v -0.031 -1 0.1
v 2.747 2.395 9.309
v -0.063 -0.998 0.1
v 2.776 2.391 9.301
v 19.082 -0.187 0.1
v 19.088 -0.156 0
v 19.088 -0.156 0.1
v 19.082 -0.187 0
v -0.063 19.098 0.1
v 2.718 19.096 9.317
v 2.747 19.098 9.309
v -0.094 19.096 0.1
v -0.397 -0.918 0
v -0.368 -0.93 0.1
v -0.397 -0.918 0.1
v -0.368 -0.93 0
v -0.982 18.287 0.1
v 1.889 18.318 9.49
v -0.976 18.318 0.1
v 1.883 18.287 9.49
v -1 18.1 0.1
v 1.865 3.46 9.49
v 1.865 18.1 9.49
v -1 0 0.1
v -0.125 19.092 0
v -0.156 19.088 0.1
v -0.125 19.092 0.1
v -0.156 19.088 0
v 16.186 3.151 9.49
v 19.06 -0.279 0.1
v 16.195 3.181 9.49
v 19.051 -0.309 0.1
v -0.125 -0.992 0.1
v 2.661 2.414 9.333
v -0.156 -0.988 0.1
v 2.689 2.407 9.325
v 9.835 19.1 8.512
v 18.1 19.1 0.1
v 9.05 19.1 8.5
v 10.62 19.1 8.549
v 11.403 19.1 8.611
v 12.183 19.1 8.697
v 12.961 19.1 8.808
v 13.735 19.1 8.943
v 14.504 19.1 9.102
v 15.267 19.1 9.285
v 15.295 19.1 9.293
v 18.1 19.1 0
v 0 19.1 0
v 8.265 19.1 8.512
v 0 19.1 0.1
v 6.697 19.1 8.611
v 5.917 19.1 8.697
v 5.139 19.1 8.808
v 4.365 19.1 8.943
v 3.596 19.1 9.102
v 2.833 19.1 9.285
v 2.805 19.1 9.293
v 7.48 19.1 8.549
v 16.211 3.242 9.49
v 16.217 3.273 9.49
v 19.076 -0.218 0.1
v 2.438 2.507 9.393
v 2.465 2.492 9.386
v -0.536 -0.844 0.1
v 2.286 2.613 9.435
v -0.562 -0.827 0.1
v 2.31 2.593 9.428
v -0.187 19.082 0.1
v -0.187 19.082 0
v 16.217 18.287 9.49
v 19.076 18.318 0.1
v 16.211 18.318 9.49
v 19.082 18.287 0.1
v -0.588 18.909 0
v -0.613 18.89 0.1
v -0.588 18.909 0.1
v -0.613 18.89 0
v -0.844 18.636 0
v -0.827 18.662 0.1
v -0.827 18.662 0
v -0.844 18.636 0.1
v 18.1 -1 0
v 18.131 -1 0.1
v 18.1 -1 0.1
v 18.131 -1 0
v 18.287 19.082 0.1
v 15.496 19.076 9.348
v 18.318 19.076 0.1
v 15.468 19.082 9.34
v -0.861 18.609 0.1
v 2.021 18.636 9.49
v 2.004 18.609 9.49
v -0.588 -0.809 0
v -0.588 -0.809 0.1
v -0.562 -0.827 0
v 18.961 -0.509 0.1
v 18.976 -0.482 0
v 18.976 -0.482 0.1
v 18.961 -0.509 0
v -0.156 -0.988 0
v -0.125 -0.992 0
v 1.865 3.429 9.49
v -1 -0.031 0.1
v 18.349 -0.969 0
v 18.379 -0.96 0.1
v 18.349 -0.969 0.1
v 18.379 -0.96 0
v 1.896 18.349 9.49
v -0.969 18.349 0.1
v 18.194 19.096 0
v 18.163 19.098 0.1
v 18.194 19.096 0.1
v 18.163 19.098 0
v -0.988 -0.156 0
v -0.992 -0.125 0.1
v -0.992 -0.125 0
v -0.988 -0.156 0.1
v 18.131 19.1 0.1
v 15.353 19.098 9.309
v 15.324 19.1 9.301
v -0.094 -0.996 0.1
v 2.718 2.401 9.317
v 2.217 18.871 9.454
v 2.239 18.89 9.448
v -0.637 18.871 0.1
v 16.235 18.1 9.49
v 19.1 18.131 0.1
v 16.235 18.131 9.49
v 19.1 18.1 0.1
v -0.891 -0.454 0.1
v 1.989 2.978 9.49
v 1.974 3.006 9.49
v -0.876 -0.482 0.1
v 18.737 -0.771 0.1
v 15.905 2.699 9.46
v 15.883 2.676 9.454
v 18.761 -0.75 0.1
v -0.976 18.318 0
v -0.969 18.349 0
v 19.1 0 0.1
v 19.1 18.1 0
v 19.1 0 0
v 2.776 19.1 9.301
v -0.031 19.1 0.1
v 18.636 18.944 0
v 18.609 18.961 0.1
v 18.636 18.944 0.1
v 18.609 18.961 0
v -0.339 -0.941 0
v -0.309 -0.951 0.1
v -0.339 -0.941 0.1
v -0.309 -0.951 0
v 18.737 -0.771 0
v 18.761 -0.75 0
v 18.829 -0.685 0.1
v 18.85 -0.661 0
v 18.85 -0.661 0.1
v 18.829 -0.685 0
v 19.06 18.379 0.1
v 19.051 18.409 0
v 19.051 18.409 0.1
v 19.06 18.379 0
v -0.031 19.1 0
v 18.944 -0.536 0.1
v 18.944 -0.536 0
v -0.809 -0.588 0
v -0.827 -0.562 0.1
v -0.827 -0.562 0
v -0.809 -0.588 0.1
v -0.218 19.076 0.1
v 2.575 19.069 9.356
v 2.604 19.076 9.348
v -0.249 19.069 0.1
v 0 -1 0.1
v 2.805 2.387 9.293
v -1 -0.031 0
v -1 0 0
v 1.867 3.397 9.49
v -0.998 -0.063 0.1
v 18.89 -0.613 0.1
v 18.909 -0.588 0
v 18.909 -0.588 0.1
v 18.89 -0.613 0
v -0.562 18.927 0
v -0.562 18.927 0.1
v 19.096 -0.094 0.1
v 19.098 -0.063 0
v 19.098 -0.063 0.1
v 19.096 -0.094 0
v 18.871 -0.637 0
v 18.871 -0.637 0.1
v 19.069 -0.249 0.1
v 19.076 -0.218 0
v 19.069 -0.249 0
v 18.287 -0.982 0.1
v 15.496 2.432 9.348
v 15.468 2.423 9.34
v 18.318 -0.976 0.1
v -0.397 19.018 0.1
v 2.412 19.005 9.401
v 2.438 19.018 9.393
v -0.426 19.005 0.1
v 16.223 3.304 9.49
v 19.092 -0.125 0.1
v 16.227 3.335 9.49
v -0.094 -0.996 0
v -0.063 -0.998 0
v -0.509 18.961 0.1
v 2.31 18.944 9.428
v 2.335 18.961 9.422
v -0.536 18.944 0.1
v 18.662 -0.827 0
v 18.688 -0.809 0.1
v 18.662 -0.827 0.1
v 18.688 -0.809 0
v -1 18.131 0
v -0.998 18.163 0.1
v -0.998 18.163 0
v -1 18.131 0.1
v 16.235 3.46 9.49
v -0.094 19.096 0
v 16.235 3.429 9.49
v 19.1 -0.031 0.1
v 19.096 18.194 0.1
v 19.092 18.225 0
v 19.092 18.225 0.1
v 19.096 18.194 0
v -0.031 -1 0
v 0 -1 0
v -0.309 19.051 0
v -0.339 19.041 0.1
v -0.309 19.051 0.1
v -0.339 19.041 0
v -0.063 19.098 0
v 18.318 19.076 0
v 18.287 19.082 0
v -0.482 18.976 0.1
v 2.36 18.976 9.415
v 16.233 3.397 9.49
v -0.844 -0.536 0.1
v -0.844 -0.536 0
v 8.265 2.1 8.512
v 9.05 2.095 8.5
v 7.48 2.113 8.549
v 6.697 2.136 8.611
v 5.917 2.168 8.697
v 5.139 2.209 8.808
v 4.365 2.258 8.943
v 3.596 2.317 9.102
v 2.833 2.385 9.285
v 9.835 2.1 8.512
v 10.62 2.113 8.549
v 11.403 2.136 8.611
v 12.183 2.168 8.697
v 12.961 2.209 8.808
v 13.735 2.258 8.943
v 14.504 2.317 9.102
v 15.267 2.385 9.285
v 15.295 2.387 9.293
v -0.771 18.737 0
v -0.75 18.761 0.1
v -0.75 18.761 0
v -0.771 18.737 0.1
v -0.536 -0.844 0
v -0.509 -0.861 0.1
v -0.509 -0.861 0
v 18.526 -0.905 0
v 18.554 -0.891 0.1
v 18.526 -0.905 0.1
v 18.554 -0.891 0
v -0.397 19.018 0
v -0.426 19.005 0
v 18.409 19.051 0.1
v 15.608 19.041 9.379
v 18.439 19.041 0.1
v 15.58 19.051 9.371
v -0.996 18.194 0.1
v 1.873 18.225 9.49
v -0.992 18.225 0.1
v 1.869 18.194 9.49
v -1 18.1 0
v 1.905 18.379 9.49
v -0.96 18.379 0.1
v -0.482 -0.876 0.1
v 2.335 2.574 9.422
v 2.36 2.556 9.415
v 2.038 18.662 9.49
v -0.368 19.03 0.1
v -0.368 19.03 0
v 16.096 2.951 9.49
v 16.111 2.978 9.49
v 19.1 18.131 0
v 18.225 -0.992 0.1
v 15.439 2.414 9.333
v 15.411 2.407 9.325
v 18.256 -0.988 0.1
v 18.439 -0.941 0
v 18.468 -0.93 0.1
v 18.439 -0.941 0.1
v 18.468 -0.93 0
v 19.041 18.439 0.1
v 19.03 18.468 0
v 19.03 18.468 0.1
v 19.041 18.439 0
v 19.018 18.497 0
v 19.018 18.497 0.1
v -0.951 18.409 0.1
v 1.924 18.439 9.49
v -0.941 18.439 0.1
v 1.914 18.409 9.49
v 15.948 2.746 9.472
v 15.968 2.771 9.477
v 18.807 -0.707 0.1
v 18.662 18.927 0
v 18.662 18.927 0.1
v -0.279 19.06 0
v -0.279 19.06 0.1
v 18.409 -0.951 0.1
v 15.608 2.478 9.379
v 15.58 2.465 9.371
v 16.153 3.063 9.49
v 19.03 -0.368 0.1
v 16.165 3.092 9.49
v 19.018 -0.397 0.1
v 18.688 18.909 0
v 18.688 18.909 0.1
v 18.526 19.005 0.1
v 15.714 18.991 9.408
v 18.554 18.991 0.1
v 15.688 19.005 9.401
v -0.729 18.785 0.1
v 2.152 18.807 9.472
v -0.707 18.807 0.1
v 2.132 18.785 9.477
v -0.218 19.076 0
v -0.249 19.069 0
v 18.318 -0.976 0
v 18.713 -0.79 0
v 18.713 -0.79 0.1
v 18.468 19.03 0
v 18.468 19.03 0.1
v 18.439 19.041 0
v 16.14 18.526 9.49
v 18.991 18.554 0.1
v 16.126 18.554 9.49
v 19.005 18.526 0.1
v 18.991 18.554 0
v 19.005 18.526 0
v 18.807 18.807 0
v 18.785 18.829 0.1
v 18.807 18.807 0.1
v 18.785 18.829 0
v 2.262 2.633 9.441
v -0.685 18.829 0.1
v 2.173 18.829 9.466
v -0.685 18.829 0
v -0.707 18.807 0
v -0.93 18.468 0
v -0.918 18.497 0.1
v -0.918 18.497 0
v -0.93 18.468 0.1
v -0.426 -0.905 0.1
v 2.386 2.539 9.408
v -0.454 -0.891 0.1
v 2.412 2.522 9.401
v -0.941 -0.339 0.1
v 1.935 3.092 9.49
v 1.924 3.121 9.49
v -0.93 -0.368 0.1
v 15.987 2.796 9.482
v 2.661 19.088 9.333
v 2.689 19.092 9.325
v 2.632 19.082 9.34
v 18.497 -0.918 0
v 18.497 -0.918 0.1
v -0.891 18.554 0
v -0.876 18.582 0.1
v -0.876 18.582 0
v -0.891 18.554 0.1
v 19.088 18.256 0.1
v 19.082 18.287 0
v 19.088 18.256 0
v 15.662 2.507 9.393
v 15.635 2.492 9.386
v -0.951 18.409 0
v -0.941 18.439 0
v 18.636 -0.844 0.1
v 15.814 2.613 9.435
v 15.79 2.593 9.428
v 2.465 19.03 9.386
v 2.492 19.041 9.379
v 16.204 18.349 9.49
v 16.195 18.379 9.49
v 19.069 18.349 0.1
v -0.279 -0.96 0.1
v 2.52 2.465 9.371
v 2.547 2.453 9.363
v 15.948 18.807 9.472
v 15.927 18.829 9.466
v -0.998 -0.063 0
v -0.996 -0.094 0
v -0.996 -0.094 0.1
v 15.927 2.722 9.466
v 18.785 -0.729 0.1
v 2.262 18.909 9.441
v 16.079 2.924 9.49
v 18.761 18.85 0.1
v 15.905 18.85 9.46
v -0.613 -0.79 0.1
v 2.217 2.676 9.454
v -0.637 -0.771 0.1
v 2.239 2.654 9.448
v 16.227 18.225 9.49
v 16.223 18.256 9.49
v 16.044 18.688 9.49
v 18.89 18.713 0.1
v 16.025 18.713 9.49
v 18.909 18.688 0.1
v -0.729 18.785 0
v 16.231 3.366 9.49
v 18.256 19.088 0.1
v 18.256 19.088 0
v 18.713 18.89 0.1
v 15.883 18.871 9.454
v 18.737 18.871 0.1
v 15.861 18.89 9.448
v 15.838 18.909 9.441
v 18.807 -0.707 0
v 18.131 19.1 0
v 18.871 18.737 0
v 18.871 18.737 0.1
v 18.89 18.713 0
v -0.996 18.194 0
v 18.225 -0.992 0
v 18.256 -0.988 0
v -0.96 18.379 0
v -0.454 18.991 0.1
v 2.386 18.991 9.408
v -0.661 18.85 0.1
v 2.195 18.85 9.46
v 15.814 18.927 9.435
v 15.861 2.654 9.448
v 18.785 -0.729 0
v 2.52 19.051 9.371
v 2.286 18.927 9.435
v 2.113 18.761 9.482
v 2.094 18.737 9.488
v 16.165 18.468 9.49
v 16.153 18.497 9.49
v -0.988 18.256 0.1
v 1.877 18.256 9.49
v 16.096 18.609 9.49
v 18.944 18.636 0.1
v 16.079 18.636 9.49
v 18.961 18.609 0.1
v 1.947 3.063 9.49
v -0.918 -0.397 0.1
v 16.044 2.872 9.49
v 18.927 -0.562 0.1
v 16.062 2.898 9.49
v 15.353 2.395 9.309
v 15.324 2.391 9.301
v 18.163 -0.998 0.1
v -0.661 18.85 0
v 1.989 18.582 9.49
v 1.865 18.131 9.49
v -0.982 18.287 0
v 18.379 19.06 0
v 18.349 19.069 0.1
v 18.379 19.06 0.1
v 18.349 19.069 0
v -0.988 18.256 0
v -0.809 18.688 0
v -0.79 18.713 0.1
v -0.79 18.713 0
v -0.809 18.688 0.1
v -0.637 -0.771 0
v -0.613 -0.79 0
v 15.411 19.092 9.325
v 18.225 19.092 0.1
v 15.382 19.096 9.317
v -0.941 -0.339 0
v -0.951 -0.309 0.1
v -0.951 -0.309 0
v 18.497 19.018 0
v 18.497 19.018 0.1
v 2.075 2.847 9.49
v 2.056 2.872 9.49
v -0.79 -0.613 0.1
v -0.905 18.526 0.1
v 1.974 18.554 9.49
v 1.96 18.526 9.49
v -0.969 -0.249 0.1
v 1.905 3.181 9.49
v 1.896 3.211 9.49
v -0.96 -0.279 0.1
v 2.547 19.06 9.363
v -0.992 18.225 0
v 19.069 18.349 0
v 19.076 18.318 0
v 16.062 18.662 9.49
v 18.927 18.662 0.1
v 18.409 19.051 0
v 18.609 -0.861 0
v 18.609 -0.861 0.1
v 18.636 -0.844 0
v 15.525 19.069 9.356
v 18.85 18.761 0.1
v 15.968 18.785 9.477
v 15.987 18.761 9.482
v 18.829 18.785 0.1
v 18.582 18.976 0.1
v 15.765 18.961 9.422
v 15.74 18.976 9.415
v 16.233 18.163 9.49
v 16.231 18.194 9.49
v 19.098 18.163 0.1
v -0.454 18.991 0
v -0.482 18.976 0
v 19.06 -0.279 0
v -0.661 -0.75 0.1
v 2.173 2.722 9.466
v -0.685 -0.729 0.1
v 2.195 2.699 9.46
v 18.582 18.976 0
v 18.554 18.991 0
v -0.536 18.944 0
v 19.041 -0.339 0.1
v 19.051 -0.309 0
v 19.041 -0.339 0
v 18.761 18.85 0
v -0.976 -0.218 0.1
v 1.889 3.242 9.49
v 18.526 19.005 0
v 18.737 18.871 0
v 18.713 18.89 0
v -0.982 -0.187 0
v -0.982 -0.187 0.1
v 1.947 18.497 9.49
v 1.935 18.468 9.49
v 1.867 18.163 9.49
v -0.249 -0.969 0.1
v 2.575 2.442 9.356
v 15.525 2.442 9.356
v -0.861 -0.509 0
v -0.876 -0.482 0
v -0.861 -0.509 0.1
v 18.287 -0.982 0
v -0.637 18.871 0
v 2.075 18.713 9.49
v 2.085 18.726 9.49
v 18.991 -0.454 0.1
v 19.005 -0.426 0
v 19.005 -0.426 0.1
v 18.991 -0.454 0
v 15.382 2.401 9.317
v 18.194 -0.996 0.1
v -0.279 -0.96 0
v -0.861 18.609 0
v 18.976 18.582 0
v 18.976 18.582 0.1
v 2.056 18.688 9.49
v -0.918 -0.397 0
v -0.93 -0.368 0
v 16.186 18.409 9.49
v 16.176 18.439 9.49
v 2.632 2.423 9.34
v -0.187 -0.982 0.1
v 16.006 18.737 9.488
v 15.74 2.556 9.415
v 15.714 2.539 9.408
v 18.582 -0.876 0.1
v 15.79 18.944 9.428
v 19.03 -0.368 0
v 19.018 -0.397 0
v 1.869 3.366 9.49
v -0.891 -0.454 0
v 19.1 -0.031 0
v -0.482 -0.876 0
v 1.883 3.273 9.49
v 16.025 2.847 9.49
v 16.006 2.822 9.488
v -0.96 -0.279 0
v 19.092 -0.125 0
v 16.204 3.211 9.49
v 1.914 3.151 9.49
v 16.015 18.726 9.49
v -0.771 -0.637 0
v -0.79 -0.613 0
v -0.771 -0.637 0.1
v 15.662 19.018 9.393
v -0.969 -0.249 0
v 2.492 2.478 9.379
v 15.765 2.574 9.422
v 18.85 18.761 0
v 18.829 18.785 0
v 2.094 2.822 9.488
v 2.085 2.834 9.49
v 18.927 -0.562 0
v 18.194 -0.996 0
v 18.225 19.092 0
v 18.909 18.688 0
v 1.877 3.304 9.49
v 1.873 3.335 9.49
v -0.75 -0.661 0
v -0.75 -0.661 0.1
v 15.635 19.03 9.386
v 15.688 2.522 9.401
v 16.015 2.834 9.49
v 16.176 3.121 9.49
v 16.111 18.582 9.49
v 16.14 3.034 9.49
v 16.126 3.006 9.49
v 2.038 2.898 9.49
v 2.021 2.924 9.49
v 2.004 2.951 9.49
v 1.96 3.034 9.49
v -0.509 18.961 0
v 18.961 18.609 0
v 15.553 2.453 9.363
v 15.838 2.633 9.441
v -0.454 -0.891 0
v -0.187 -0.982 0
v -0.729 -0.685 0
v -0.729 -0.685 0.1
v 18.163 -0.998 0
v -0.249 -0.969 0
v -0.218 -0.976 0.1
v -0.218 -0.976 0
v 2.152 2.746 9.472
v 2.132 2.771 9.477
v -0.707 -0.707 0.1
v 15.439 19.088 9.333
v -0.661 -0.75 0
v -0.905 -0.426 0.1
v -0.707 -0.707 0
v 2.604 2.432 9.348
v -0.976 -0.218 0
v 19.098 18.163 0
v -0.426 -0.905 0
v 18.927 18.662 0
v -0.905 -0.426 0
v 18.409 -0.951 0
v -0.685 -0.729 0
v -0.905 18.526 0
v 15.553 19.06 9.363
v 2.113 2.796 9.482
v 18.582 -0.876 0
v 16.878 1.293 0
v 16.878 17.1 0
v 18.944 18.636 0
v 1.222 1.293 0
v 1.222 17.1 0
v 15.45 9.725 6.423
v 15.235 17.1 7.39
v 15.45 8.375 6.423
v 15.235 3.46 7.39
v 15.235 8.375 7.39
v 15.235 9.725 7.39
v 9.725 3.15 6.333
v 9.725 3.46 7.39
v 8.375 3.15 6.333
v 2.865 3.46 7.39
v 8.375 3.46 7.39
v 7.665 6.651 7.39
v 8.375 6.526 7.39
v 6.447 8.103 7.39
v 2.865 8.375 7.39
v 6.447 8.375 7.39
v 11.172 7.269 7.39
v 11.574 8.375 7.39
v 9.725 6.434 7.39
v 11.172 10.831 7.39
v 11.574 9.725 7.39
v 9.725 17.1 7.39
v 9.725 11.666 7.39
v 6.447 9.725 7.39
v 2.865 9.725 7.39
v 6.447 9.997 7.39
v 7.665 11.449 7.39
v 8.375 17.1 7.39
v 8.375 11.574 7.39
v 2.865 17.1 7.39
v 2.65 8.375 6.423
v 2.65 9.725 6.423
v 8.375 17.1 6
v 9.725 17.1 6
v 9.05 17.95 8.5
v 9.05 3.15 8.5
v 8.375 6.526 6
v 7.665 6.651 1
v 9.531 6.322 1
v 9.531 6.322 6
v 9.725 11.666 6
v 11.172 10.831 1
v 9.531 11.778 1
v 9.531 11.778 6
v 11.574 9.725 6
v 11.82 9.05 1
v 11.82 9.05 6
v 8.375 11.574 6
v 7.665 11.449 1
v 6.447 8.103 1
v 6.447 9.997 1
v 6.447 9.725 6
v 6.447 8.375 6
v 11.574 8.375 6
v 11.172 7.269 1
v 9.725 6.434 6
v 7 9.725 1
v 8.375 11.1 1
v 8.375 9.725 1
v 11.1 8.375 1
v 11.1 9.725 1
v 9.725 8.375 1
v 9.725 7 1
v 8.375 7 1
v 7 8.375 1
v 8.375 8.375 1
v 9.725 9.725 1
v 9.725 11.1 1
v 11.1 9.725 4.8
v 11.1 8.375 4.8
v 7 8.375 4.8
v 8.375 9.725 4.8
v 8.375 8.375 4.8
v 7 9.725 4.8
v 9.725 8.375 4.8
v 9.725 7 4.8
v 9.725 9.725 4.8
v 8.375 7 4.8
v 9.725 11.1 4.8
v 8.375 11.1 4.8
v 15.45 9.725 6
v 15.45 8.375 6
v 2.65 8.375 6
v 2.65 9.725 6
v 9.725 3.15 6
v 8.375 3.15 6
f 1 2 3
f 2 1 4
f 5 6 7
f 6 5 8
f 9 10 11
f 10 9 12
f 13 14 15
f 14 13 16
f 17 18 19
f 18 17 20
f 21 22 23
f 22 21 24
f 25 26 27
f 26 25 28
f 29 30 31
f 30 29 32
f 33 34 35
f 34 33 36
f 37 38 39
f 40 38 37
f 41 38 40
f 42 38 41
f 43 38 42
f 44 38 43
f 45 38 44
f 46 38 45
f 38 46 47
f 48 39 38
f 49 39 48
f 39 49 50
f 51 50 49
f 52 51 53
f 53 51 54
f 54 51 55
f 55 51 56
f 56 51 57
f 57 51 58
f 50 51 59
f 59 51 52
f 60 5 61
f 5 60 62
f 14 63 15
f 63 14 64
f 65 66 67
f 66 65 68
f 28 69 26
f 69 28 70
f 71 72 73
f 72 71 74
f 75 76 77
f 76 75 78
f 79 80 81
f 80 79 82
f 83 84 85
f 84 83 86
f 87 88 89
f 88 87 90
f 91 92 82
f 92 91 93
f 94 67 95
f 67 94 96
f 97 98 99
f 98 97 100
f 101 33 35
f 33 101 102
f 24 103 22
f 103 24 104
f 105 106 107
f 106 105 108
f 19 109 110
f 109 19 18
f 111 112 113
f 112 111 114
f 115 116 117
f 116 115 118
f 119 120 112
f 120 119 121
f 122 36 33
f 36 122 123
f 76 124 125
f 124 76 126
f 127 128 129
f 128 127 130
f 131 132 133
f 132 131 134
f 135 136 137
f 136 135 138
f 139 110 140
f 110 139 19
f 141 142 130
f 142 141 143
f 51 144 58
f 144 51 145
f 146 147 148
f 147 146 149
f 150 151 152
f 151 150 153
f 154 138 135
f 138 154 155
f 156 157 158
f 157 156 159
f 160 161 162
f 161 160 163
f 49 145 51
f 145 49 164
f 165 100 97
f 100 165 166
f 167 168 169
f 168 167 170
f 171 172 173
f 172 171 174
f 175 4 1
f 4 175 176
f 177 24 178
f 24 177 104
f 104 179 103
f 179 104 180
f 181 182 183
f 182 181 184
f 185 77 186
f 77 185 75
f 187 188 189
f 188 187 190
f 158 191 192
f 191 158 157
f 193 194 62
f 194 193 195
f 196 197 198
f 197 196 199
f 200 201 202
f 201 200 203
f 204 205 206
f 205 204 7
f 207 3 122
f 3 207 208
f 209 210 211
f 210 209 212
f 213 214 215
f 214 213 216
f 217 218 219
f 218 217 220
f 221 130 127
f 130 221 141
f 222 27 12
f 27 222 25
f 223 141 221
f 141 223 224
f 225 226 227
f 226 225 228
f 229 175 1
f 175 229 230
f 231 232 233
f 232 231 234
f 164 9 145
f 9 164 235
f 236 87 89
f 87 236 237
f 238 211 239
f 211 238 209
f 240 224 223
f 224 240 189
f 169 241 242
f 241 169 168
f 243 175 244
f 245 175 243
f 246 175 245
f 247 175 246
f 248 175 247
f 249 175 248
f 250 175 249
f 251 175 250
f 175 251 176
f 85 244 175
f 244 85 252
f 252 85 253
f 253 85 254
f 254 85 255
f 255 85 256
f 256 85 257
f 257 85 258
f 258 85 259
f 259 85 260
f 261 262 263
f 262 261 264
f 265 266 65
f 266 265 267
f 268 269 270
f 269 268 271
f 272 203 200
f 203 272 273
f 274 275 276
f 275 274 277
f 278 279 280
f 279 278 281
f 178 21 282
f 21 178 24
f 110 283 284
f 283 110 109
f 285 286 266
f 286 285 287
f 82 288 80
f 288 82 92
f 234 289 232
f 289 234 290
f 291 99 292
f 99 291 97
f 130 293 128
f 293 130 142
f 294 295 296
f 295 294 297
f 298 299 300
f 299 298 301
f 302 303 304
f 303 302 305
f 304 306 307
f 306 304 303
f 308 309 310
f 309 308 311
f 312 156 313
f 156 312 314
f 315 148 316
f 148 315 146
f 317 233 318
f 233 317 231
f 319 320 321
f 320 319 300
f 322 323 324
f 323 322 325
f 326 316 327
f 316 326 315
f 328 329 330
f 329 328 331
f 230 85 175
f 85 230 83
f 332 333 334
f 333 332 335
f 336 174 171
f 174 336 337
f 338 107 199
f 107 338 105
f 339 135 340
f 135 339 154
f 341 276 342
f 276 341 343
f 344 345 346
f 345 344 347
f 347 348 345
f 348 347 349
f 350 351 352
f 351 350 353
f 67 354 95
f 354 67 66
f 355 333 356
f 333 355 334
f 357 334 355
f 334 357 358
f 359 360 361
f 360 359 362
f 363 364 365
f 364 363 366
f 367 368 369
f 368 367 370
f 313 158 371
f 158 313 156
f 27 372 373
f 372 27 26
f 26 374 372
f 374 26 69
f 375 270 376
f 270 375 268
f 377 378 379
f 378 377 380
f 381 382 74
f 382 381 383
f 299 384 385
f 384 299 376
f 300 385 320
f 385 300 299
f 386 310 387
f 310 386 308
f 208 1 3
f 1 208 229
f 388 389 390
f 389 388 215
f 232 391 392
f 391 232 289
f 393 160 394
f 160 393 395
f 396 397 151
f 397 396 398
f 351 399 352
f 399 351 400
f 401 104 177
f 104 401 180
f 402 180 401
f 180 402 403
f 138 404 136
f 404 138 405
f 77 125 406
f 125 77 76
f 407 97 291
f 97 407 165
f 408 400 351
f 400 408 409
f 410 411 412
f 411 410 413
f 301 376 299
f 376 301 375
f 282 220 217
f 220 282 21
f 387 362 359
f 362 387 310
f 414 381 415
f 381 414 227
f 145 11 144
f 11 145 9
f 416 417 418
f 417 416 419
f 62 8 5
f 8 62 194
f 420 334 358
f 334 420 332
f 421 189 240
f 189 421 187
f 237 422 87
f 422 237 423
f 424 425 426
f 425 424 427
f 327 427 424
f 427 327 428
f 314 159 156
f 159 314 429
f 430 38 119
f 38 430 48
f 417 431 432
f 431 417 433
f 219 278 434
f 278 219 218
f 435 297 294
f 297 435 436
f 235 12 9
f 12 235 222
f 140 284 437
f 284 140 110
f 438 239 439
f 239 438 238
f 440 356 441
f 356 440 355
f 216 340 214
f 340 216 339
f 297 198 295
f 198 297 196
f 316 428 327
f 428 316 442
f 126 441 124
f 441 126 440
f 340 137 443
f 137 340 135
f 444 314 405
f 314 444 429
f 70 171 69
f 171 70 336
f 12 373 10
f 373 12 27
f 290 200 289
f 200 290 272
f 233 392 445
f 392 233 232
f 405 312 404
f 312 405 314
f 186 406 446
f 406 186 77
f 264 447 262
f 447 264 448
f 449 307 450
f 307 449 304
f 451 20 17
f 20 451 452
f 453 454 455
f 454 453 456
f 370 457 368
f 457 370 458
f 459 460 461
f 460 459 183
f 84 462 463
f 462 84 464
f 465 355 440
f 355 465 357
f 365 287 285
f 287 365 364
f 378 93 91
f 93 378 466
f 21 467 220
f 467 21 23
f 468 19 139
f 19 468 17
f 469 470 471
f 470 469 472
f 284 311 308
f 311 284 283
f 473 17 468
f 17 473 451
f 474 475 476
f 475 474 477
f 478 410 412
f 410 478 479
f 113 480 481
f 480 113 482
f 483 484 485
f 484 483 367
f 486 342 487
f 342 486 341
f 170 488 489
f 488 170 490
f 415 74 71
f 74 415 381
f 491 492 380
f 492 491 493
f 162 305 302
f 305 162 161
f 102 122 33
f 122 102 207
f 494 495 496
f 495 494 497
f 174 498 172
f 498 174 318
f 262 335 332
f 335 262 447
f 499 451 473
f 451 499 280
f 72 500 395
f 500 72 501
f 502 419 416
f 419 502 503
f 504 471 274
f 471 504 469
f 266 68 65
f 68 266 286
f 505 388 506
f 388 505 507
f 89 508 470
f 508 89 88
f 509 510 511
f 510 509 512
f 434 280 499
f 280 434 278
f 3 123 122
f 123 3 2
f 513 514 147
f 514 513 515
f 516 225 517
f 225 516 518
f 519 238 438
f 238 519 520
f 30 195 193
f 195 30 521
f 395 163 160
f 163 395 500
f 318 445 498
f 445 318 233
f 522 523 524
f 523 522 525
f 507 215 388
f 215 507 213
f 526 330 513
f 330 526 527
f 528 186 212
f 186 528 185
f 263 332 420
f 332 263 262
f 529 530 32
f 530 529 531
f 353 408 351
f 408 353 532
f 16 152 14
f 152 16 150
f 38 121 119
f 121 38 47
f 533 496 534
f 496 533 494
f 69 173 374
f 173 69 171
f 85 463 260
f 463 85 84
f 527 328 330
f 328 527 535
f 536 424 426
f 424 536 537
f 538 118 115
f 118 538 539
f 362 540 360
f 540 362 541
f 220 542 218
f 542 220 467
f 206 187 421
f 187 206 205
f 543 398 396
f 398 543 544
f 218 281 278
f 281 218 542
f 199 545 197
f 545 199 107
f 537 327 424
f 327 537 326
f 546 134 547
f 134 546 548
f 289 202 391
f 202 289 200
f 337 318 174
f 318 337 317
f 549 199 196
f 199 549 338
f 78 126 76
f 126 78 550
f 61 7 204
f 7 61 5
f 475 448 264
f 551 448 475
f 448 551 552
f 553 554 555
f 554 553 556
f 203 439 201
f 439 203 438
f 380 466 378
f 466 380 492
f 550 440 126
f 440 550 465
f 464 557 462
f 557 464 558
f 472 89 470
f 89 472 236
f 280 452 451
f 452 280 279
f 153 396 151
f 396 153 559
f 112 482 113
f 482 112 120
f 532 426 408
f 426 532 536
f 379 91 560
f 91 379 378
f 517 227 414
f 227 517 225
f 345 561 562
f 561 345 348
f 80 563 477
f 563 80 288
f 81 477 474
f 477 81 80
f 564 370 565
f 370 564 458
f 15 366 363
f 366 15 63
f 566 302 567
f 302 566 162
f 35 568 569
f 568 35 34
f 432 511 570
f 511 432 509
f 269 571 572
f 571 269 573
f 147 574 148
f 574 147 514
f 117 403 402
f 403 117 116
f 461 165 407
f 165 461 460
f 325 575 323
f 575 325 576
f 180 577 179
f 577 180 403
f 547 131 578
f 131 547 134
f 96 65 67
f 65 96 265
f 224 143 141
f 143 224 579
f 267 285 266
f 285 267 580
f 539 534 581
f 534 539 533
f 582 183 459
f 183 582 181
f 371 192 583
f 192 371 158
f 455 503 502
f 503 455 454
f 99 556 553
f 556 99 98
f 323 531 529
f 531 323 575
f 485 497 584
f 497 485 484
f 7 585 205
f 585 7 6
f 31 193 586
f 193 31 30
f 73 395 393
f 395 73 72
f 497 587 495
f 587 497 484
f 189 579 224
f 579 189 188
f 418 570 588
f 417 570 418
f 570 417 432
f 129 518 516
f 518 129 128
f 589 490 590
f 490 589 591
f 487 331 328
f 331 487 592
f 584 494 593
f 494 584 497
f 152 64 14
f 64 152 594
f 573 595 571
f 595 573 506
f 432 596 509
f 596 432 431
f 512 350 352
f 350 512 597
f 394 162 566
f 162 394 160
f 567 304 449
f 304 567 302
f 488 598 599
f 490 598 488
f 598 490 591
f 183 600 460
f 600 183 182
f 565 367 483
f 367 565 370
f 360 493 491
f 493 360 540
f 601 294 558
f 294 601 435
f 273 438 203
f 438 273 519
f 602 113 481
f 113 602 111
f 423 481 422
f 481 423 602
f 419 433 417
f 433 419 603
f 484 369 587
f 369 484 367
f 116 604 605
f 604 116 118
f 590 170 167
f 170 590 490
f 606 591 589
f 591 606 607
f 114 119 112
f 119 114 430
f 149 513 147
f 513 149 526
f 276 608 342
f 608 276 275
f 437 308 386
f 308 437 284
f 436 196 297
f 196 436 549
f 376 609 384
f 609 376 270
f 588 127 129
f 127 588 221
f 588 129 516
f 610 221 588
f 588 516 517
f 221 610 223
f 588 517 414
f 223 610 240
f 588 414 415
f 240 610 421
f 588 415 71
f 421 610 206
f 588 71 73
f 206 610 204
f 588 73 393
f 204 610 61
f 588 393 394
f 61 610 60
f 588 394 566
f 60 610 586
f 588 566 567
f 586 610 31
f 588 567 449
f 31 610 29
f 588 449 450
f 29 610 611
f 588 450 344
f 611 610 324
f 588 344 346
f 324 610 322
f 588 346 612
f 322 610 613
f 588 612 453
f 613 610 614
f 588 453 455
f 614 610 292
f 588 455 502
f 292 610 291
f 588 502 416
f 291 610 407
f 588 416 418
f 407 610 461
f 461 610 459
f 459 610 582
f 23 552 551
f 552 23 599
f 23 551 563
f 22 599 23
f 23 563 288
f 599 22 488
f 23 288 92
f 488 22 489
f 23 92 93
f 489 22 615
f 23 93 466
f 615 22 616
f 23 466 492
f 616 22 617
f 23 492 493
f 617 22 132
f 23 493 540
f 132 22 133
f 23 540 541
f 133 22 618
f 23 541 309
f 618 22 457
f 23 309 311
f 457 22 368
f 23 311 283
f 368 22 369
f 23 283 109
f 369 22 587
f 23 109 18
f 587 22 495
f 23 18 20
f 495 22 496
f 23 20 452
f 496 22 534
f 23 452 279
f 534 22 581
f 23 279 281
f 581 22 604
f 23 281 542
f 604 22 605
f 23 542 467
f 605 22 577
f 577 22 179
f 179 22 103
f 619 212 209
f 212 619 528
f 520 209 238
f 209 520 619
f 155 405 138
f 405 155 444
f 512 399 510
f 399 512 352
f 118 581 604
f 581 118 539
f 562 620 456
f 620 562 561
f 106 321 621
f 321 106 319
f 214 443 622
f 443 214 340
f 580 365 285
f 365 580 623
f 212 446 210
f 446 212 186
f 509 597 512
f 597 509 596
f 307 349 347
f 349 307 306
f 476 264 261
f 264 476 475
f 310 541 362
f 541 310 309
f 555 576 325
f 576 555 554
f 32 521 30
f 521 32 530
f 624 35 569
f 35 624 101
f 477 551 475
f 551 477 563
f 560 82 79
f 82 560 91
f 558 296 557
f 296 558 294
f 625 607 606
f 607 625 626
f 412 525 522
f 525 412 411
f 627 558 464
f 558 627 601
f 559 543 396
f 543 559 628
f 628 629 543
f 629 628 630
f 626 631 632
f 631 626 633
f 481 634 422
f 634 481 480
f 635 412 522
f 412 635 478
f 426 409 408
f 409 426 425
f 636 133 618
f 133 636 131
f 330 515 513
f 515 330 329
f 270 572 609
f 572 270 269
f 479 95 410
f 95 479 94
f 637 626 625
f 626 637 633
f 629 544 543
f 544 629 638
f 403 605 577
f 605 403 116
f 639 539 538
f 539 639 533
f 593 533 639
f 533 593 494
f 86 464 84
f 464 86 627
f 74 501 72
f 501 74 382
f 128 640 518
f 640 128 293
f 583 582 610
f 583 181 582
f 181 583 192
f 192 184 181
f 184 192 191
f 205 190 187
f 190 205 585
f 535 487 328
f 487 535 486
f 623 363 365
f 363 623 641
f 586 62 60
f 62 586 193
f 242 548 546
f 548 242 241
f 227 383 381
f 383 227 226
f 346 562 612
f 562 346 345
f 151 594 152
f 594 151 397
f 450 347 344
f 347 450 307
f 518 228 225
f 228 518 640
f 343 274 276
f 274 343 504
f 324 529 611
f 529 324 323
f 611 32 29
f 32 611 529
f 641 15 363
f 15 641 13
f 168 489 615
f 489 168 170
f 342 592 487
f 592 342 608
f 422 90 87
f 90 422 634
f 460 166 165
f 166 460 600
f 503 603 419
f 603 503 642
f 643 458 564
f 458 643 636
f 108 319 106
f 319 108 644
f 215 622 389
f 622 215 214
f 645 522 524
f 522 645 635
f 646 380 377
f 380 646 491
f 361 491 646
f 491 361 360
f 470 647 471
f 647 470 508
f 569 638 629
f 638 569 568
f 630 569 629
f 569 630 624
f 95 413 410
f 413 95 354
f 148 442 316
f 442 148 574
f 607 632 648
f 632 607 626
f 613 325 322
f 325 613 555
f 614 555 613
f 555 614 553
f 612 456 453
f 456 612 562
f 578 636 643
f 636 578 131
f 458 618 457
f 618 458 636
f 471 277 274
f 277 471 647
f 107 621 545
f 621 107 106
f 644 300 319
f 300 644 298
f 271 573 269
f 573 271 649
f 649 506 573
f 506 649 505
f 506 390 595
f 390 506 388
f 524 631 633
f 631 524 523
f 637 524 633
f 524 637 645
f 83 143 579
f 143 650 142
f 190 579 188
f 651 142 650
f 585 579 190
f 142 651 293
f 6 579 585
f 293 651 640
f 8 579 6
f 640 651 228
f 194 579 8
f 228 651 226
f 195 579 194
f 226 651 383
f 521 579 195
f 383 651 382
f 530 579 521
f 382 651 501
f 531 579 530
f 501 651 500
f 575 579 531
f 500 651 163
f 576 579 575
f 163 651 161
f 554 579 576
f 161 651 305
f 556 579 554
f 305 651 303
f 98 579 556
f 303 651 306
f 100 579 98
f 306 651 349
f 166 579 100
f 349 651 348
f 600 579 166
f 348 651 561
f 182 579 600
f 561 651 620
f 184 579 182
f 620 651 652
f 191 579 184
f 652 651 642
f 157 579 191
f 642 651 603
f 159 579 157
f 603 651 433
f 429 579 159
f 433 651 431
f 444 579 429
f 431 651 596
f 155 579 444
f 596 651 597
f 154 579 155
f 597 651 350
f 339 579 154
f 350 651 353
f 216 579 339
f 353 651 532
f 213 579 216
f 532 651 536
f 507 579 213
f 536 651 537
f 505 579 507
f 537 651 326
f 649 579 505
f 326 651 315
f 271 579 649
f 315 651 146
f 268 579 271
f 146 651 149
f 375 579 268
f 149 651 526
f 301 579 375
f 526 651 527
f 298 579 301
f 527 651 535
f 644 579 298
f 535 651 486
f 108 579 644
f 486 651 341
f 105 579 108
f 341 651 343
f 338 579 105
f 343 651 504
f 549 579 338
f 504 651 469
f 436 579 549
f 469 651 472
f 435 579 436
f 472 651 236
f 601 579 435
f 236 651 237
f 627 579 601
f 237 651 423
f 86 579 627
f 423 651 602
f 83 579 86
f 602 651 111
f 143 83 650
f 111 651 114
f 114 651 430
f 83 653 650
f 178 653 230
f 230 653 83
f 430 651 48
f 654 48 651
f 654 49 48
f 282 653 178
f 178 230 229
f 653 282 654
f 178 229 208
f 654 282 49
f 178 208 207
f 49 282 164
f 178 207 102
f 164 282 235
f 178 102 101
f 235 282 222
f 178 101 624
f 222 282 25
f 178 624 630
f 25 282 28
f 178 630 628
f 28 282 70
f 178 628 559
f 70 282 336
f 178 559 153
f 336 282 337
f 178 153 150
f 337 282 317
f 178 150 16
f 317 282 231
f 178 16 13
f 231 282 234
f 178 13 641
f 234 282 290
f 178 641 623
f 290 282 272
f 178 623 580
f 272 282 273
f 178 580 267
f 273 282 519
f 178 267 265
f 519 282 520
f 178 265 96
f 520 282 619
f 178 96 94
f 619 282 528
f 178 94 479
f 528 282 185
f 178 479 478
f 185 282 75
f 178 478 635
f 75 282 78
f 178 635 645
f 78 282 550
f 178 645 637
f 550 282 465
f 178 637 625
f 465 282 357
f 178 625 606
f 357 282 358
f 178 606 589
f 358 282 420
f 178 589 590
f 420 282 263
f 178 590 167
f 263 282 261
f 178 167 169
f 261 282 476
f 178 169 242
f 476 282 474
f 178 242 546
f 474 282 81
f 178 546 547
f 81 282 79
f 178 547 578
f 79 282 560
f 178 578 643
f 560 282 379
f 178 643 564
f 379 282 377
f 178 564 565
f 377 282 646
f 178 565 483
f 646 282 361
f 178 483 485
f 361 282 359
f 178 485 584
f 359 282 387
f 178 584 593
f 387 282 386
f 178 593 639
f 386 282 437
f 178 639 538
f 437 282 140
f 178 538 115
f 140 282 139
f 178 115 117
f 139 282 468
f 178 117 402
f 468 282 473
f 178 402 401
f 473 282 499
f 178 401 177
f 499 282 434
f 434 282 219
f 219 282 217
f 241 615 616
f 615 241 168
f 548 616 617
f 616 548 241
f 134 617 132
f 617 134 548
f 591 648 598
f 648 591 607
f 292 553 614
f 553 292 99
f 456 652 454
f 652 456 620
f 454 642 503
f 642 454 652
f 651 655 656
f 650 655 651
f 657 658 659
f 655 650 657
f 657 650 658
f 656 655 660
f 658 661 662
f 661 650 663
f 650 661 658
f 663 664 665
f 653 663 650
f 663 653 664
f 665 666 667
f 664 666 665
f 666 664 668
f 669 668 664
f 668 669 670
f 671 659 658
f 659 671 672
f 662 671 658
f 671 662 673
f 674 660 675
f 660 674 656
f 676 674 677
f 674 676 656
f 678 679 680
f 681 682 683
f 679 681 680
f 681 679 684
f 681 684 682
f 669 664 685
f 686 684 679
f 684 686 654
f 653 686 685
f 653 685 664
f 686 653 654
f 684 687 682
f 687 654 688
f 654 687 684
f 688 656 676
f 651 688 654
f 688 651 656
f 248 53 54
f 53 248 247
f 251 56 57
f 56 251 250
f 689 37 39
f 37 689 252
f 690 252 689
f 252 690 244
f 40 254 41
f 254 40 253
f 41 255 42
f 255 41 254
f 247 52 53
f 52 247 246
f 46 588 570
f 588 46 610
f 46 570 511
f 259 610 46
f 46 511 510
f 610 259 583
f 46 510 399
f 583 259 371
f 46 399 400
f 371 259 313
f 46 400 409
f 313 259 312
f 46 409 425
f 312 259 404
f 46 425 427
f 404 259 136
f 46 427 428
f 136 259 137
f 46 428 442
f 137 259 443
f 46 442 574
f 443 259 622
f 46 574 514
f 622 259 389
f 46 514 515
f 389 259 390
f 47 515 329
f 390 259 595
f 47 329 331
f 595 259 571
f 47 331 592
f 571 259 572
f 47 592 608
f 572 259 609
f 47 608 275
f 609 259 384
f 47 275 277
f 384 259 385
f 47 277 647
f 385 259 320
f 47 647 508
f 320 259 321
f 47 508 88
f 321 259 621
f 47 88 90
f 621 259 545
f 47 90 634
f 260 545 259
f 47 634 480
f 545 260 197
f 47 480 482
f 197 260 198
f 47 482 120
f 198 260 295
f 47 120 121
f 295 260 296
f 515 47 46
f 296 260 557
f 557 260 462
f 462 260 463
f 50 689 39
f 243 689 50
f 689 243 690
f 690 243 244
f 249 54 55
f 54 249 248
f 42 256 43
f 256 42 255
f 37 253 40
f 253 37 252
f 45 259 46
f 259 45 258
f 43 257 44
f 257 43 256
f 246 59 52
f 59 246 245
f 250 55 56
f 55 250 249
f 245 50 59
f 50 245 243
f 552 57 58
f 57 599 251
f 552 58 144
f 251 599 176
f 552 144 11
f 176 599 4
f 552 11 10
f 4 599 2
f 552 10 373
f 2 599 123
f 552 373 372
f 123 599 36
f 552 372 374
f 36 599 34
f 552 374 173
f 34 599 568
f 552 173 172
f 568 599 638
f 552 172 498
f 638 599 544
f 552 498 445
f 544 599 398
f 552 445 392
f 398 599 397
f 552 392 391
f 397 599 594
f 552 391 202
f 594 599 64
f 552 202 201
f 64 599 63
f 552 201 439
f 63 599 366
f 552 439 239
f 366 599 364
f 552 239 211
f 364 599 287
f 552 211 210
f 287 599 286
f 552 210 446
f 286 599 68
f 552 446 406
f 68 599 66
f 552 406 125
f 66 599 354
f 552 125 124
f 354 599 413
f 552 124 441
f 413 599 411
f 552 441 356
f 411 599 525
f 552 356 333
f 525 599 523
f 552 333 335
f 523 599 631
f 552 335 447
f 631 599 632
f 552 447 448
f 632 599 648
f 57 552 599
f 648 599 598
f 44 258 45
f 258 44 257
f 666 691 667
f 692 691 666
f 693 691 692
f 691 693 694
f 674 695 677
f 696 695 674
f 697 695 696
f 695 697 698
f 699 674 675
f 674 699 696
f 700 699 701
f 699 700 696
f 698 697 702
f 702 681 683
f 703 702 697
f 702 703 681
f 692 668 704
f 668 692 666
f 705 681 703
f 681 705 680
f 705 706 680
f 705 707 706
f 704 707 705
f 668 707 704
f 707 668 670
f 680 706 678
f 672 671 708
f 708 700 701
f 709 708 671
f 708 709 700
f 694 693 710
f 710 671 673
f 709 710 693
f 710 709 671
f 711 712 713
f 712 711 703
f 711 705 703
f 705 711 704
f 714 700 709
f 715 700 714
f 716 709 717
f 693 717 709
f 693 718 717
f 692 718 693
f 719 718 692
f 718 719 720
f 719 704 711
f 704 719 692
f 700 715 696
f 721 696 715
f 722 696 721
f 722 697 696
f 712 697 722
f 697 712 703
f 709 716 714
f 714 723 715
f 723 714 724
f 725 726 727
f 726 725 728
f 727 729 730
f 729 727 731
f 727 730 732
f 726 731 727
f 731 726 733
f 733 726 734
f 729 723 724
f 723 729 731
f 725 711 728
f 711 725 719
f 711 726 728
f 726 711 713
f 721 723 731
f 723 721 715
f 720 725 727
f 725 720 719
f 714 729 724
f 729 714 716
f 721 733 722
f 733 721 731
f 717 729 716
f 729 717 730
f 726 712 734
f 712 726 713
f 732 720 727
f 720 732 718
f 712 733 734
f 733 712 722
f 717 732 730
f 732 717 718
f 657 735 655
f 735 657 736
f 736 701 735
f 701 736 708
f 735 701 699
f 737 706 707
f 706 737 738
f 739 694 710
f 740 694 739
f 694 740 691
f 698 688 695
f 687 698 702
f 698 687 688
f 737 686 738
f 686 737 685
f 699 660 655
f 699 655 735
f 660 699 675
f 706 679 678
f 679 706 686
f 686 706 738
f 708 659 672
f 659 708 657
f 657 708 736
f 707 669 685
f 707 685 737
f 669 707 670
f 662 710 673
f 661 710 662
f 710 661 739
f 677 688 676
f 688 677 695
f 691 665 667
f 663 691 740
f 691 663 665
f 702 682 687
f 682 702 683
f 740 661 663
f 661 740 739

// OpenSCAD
precision = 200;

KeyPoints = [
 [    0,    0, 0 ],  // 0
 [ 18.1,    0, 0 ],  // 1
 [ 18.1, 18.1, 0 ],  // 2
 [    0, 18.1, 0 ],  // 3
 [ 2.865, 3.46, 9.39 ],  // 4
 [ 15.235, 3.46, 9.39 ],  // 5
 [ 15.235, 18.1, 9.39 ],  // 6
 [ 2.865, 18.1, 9.39 ]  // 7
];

KeyInnerPoints = [
 [    1,    1, -1 ],  // 0
 [ 17.1,    1, -1 ],  // 1
 [ 17.1, 17.1, -1 ],  // 2
 [    1, 17.1, -1 ],  // 3
 [ 2.865, 3.46, 7.39 ],  // 4
 [ 15.235, 3.46, 7.39 ],  // 5
 [ 15.235, 17.1, 7.39 ],  // 6
 [ 2.865, 17.1, 7.39 ]  // 7
];

KeyFaces = [
  [0,1,2,3],  // bottom
  [4,5,1,0],  // front
  [7,6,5,4],  // top
  [5,6,2,1],  // right
  [6,7,3,2],  // back
  [7,4,0,3]]; // left
  
// Main key
difference() {
    minkowski() {
        polyhedron( KeyPoints, KeyFaces );
        cylinder(r=1, h=0.1, $fn=precision);
    }
    polyhedron( KeyInnerPoints, KeyFaces );
    translate([9.05, 22, 33.5]){
        rotate([90, 90, 0]){
            cylinder(h=25, d=50, $fn=precision, center=false);
    }}
}

// Center attachment
translate([9.05, 9.05, 1]){
    difference() {
        cylinder( h=7.5, d=5.54, center=false);
        cube([4.10, 1.35, 7.6], center=true);
        cube([1.35, 4.10, 7.6], center=true);
    }

};

// Center supports
translate([9.05, 9.05, 7.25]){
    cube([12.8, 1.35, 2.5], center=true);
}
translate([9.05, 10.55, 7.25]){
    cube([1.35, 14.8, 2.5], center=true);
}
